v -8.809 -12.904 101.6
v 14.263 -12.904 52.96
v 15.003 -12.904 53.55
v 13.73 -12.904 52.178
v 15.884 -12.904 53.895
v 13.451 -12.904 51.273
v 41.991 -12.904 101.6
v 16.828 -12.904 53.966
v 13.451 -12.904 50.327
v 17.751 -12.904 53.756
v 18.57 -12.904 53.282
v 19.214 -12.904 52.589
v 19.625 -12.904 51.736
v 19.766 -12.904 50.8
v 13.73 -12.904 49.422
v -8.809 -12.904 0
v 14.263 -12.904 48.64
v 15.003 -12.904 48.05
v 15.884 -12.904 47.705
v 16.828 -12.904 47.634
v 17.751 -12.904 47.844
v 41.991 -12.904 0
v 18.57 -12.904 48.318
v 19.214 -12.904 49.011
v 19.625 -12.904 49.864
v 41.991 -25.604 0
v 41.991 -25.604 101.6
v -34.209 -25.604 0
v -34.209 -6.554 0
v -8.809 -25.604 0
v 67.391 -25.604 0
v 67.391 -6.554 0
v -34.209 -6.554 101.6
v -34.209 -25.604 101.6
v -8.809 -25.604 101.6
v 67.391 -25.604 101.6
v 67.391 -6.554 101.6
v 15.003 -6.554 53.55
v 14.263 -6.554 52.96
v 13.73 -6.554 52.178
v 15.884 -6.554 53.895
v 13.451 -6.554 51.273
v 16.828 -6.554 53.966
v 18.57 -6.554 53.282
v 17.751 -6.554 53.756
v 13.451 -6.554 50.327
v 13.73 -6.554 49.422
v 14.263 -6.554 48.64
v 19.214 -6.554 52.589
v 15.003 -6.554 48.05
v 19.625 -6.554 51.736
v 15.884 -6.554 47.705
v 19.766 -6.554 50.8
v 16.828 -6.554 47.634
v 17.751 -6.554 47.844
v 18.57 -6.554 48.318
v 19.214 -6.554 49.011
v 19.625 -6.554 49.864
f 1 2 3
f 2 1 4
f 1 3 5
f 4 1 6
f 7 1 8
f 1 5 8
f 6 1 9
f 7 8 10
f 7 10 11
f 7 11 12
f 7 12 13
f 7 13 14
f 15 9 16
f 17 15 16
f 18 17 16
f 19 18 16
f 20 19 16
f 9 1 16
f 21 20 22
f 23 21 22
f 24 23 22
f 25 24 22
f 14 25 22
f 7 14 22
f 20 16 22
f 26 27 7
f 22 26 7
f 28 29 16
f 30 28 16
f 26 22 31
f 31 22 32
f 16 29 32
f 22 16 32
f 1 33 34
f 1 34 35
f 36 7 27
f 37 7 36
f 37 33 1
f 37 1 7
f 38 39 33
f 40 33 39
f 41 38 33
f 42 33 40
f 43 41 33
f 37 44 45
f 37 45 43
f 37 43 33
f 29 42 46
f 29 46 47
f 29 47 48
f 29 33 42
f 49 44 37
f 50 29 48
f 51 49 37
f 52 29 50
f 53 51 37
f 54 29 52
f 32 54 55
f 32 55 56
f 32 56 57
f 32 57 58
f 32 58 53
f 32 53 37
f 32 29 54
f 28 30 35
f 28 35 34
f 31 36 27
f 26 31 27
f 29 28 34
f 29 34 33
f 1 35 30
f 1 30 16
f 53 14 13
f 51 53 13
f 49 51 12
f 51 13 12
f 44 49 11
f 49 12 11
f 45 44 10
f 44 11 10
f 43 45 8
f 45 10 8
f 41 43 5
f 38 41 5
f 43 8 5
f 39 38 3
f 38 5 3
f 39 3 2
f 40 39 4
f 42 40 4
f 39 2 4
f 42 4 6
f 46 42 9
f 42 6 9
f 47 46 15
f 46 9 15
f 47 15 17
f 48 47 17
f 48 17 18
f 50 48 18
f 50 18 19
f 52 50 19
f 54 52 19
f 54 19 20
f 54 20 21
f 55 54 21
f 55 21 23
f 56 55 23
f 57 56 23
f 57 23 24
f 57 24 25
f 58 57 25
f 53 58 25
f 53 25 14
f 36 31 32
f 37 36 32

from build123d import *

# Parameters (mm, degrees)
F0_W     = 101.6
F0_H     = 25.4
F0_W_2   = 50.8
F0_H_2   = 12.7
F1_DEPTH = 101.6
F3_DEPTH = 101.601
F5_D     = 6.35


with BuildPart() as f1:
    # F0 (on Top) → F1 (new body)
    with BuildSketch(Plane.XY):
        with Locations((16.590777, -19.253528)):
            Rectangle(F0_W, F0_H)
        with Locations((16.590777, -19.253528)):
            Rectangle(F0_W_2, F0_H_2, mode=Mode.SUBTRACT)
    extrude(amount=F1_DEPTH)

    # F2 (on face) → F3 (cut, through all)
    with BuildSketch(Plane.XY.offset(101.6)):
        Polygon((41.990777, -25.603528), (-8.809223, -25.603528), (-34.209223, -25.603528), (-34.209223, -31.953528), (67.390777, -31.953528), (67.390777, -25.603528), align=None)
    extrude(amount=-F3_DEPTH, mode=Mode.SUBTRACT)

    # F5 (through all)
    with Locations(Plane(origin=(0, -6.553528, 0), x_dir=(-1, 0, 0), z_dir=(0, 1, 0))):
        with Locations((-16.590777, 50.8)):
            Hole(F5_D / 2)


solid = f1.part
